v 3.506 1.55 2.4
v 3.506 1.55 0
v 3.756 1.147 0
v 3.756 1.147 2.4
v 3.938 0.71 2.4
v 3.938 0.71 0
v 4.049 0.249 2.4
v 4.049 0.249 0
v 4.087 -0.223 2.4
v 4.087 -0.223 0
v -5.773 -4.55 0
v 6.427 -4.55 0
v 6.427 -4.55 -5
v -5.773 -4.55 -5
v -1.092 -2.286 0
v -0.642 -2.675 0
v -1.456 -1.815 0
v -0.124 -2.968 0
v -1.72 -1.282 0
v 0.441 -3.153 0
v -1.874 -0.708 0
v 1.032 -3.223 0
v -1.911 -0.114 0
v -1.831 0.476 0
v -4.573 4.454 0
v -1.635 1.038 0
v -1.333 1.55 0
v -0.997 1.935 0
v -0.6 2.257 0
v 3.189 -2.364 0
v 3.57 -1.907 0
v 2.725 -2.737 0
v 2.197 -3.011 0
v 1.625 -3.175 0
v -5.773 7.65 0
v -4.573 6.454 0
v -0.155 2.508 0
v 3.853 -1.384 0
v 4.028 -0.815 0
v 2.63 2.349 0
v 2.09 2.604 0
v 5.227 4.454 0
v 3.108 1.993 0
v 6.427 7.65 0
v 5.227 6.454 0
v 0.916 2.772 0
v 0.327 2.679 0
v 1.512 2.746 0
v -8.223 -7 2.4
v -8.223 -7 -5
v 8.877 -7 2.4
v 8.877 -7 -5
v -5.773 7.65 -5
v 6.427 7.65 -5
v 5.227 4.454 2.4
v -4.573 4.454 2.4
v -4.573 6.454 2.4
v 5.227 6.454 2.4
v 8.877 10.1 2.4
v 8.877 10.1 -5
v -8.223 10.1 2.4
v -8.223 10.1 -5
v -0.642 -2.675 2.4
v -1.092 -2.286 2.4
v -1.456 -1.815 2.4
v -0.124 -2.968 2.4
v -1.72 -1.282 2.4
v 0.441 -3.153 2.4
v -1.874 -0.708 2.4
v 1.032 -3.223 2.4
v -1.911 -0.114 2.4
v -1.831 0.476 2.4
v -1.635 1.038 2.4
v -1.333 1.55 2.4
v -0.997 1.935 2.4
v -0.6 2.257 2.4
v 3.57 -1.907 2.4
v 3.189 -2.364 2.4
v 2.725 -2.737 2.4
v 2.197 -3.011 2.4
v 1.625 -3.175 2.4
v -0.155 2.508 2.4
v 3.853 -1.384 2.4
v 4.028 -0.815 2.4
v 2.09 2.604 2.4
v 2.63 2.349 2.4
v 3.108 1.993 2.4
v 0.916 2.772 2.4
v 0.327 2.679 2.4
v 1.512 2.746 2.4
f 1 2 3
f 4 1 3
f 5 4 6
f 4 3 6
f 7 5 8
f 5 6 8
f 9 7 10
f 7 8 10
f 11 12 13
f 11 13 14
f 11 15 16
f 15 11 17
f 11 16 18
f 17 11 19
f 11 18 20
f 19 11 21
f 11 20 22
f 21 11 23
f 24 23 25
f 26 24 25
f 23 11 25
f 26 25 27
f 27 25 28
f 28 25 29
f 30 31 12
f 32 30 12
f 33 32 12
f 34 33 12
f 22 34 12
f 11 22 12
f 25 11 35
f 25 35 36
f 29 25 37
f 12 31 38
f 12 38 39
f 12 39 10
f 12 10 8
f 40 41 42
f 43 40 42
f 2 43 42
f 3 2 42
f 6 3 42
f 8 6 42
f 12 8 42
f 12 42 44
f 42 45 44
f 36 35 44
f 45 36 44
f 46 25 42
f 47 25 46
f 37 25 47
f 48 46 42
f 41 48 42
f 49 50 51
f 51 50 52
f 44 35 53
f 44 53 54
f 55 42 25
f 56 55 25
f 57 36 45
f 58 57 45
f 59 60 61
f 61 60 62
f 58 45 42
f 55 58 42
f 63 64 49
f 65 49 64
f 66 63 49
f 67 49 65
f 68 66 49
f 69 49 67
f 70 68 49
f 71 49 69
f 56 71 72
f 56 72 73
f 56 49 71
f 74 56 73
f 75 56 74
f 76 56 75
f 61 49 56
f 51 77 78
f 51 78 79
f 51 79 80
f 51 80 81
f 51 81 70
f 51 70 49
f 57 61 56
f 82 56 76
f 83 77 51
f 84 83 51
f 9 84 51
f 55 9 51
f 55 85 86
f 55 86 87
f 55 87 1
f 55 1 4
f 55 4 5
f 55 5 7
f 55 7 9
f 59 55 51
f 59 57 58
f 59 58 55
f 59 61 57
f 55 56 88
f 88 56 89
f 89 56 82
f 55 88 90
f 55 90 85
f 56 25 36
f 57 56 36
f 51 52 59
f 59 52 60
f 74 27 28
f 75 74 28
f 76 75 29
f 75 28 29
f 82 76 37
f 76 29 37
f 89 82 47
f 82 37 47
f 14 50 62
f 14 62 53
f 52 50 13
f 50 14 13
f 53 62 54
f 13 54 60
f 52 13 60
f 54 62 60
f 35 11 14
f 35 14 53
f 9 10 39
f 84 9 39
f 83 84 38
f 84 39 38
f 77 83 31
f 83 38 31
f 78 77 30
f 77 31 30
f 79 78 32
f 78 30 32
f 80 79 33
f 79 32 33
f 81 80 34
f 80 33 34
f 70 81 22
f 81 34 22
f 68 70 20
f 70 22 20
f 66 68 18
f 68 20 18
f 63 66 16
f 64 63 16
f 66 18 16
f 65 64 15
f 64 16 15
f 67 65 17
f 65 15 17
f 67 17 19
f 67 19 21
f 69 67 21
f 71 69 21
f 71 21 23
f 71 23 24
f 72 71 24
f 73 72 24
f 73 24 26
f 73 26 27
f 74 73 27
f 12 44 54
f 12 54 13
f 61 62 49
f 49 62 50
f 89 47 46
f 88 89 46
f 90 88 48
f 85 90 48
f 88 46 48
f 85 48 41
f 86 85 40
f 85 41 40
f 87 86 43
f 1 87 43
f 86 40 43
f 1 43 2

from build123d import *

# Parameters (mm, degrees)
F1_DEPTH = 5
F2_DEPTH = 2.4


with BuildPart() as f1:
    # F0 (on Top) → F1 (new body)
    with BuildSketch(Plane.XY):
        with BuildLine():
            Line((-8.2229121849, -7), (8.8770878151, -7))
            Line((8.8770878151, -7), (8.8770878151, -4.5))
            Line((8.8770878151, -4.5), (8.8770878151, 1.55))
            Line((8.8770878151, 1.55), (6.4270878151, 1.55))
            Line((6.4270878151, 1.55), (6.4270878151, -4.55))
            Line((6.4270878151, -4.55), (3.9714117296, -4.55))
            ThreePointArc((3.9714117296, -4.55), (1.0867994279, -5.4234526619), (-1.7978128738, -4.55))
            Line((-1.7978128738, -4.55), (-5.7729121849, -4.55))
            Line((-5.7729121849, -4.55), (-5.7729121849, 1.55))
            Line((-5.7729121849, 1.55), (-8.2229121849, 1.55))
            Line((-8.2229121849, 1.55), (-8.2229121849, -7))
        make_face()
        Polygon((-8.2229121849, 10.1), (-8.2229121849, 1.55), (-5.7729121849, 1.55), (-5.7729121849, 7.65), (6.4270878151, 7.65), (6.4270878151, 1.55), (8.8770878151, 1.55), (8.8770878151, 7.6), (8.8770878151, 10.1), align=None)
        with BuildLine():
            Line((3.9714117296, -4.55), (-1.7978128738, -4.55))
            ThreePointArc((-1.7978128738, -4.55), (1.0867994279, -5.4234526619), (3.9714117296, -4.55))
        make_face()
    extrude(amount=-F1_DEPTH)

    # F0 (on Top) → F2 (join)
    with BuildSketch(Plane.XY):
        Polygon((-8.2229121849, 10.1), (-8.2229121849, 1.55), (-5.7729121849, 1.55), (-5.7729121849, 7.65), (6.4270878151, 7.65), (6.4270878151, 1.55), (8.8770878151, 1.55), (8.8770878151, 7.6), (8.8770878151, 10.1), align=None)
        with BuildLine():
            Line((-5.7729121849, 7.65), (-5.7729121849, 1.55))
            Line((-5.7729121849, 1.55), (-3.8014380516, 1.55))
            ThreePointArc((-3.8014380516, 1.55), (-2.776349623, 3.2573632497), (-1.1846618734, 4.4542031139))
            Line((-1.1846618734, 4.4542031139), (-4.5729121849, 4.4542031139))
            Line((-4.5729121849, 4.4542031139), (-4.5729121849, 6.4542031139))
            Line((-4.5729121849, 6.4542031139), (5.2270878151, 6.4542031139))
            Line((5.2270878151, 6.4542031139), (5.2270878151, 4.4542031139))
            Line((5.2270878151, 4.4542031139), (3.3582607291, 4.4542031139))
            ThreePointArc((3.3582607291, 4.4542031139), (4.9499484788, 3.2573632497), (5.9750369074, 1.55))
            Line((5.9750369074, 1.55), (6.4270878151, 1.55))
            Line((6.4270878151, 1.55), (6.4270878151, 7.65))
            Line((6.4270878151, 7.65), (-5.7729121849, 7.65))
        make_face()
        with BuildLine():
            ThreePointArc((-1.1846618734, 4.4542031139), (-2.776349623, 3.2573632497), (-3.8014380516, 1.55))
            Line((-3.8014380516, 1.55), (-1.3328835382, 1.55))
            ThreePointArc((-1.3328835382, 1.55), (-0.6001096537, 2.2573411124), (0.3270878151, 2.678759988))
            Line((0.3270878151, 2.678759988), (0.3270878151, 4.4542031139))
            Line((0.3270878151, 4.4542031139), (-1.1846618734, 4.4542031139))
        make_face()
        with BuildLine():
            Line((3.5064823939, 1.55), (5.9750369074, 1.55))
            ThreePointArc((5.9750369074, 1.55), (4.9499484788, 3.2573632497), (3.3582607291, 4.4542031139))
            Line((3.3582607291, 4.4542031139), (0.3270878151, 4.4542031139))
            Line((0.3270878151, 4.4542031139), (0.3270878151, 2.678759988))
            ThreePointArc((0.3270878151, 2.678759988), (2.0904931068, 2.6036658356), (3.5064823939, 1.55))
        make_face()
        with BuildLine():
            Line((-1.3328835382, 1.55), (-3.8014380516, 1.55))
            ThreePointArc((-3.8014380516, 1.55), (-3.8535242893, -1.8461669219), (-1.7978128738, -4.55))
            Line((-1.7978128738, -4.55), (3.9714117296, -4.55))
            ThreePointArc((3.9714117296, -4.55), (5.6715559082, -2.6770231246), (6.2867994279, -0.2234526619))
            ThreePointArc((6.2867994279, -0.2234526619), (6.2082657654, 0.6768709207), (5.9750369074, 1.55))
            Line((5.9750369074, 1.55), (3.5064823939, 1.55))
            ThreePointArc((3.5064823939, 1.55), (3.938031521, 0.7095401307), (4.0867994279, -0.2234526619))
            ThreePointArc((4.0867994279, -0.2234526619), (0.1538066353, -3.074684755), (-1.3328835382, 1.55))
        make_face()
        with BuildLine():
            Line((-3.8014380516, 1.55), (-5.7729121849, 1.55))
            Line((-5.7729121849, 1.55), (-5.7729121849, -4.55))
            Line((-5.7729121849, -4.55), (-1.7978128738, -4.55))
            ThreePointArc((-1.7978128738, -4.55), (-3.8535242893, -1.8461669219), (-3.8014380516, 1.55))
        make_face()
        with BuildLine():
            Line((-8.2229121849, -7), (8.8770878151, -7))
            Line((8.8770878151, -7), (8.8770878151, -4.5))
            Line((8.8770878151, -4.5), (8.8770878151, 1.55))
            Line((8.8770878151, 1.55), (6.4270878151, 1.55))
            Line((6.4270878151, 1.55), (6.4270878151, -4.55))
            Line((6.4270878151, -4.55), (3.9714117296, -4.55))
            ThreePointArc((3.9714117296, -4.55), (1.0867994279, -5.4234526619), (-1.7978128738, -4.55))
            Line((-1.7978128738, -4.55), (-5.7729121849, -4.55))
            Line((-5.7729121849, -4.55), (-5.7729121849, 1.55))
            Line((-5.7729121849, 1.55), (-8.2229121849, 1.55))
            Line((-8.2229121849, 1.55), (-8.2229121849, -7))
        make_face()
        with BuildLine():
            Line((3.9714117296, -4.55), (-1.7978128738, -4.55))
            ThreePointArc((-1.7978128738, -4.55), (1.0867994279, -5.4234526619), (3.9714117296, -4.55))
        make_face()
        with BuildLine():
            Line((6.4270878151, -4.55), (6.4270878151, 1.55))
            Line((6.4270878151, 1.55), (5.9750369074, 1.55))
            ThreePointArc((5.9750369074, 1.55), (6.2082657654, 0.6768709207), (6.2867994279, -0.2234526619))
            ThreePointArc((6.2867994279, -0.2234526619), (5.6715559082, -2.6770231246), (3.9714117296, -4.55))
            Line((3.9714117296, -4.55), (6.4270878151, -4.55))
        make_face()
    extrude(amount=F2_DEPTH)


solid = f1.part
